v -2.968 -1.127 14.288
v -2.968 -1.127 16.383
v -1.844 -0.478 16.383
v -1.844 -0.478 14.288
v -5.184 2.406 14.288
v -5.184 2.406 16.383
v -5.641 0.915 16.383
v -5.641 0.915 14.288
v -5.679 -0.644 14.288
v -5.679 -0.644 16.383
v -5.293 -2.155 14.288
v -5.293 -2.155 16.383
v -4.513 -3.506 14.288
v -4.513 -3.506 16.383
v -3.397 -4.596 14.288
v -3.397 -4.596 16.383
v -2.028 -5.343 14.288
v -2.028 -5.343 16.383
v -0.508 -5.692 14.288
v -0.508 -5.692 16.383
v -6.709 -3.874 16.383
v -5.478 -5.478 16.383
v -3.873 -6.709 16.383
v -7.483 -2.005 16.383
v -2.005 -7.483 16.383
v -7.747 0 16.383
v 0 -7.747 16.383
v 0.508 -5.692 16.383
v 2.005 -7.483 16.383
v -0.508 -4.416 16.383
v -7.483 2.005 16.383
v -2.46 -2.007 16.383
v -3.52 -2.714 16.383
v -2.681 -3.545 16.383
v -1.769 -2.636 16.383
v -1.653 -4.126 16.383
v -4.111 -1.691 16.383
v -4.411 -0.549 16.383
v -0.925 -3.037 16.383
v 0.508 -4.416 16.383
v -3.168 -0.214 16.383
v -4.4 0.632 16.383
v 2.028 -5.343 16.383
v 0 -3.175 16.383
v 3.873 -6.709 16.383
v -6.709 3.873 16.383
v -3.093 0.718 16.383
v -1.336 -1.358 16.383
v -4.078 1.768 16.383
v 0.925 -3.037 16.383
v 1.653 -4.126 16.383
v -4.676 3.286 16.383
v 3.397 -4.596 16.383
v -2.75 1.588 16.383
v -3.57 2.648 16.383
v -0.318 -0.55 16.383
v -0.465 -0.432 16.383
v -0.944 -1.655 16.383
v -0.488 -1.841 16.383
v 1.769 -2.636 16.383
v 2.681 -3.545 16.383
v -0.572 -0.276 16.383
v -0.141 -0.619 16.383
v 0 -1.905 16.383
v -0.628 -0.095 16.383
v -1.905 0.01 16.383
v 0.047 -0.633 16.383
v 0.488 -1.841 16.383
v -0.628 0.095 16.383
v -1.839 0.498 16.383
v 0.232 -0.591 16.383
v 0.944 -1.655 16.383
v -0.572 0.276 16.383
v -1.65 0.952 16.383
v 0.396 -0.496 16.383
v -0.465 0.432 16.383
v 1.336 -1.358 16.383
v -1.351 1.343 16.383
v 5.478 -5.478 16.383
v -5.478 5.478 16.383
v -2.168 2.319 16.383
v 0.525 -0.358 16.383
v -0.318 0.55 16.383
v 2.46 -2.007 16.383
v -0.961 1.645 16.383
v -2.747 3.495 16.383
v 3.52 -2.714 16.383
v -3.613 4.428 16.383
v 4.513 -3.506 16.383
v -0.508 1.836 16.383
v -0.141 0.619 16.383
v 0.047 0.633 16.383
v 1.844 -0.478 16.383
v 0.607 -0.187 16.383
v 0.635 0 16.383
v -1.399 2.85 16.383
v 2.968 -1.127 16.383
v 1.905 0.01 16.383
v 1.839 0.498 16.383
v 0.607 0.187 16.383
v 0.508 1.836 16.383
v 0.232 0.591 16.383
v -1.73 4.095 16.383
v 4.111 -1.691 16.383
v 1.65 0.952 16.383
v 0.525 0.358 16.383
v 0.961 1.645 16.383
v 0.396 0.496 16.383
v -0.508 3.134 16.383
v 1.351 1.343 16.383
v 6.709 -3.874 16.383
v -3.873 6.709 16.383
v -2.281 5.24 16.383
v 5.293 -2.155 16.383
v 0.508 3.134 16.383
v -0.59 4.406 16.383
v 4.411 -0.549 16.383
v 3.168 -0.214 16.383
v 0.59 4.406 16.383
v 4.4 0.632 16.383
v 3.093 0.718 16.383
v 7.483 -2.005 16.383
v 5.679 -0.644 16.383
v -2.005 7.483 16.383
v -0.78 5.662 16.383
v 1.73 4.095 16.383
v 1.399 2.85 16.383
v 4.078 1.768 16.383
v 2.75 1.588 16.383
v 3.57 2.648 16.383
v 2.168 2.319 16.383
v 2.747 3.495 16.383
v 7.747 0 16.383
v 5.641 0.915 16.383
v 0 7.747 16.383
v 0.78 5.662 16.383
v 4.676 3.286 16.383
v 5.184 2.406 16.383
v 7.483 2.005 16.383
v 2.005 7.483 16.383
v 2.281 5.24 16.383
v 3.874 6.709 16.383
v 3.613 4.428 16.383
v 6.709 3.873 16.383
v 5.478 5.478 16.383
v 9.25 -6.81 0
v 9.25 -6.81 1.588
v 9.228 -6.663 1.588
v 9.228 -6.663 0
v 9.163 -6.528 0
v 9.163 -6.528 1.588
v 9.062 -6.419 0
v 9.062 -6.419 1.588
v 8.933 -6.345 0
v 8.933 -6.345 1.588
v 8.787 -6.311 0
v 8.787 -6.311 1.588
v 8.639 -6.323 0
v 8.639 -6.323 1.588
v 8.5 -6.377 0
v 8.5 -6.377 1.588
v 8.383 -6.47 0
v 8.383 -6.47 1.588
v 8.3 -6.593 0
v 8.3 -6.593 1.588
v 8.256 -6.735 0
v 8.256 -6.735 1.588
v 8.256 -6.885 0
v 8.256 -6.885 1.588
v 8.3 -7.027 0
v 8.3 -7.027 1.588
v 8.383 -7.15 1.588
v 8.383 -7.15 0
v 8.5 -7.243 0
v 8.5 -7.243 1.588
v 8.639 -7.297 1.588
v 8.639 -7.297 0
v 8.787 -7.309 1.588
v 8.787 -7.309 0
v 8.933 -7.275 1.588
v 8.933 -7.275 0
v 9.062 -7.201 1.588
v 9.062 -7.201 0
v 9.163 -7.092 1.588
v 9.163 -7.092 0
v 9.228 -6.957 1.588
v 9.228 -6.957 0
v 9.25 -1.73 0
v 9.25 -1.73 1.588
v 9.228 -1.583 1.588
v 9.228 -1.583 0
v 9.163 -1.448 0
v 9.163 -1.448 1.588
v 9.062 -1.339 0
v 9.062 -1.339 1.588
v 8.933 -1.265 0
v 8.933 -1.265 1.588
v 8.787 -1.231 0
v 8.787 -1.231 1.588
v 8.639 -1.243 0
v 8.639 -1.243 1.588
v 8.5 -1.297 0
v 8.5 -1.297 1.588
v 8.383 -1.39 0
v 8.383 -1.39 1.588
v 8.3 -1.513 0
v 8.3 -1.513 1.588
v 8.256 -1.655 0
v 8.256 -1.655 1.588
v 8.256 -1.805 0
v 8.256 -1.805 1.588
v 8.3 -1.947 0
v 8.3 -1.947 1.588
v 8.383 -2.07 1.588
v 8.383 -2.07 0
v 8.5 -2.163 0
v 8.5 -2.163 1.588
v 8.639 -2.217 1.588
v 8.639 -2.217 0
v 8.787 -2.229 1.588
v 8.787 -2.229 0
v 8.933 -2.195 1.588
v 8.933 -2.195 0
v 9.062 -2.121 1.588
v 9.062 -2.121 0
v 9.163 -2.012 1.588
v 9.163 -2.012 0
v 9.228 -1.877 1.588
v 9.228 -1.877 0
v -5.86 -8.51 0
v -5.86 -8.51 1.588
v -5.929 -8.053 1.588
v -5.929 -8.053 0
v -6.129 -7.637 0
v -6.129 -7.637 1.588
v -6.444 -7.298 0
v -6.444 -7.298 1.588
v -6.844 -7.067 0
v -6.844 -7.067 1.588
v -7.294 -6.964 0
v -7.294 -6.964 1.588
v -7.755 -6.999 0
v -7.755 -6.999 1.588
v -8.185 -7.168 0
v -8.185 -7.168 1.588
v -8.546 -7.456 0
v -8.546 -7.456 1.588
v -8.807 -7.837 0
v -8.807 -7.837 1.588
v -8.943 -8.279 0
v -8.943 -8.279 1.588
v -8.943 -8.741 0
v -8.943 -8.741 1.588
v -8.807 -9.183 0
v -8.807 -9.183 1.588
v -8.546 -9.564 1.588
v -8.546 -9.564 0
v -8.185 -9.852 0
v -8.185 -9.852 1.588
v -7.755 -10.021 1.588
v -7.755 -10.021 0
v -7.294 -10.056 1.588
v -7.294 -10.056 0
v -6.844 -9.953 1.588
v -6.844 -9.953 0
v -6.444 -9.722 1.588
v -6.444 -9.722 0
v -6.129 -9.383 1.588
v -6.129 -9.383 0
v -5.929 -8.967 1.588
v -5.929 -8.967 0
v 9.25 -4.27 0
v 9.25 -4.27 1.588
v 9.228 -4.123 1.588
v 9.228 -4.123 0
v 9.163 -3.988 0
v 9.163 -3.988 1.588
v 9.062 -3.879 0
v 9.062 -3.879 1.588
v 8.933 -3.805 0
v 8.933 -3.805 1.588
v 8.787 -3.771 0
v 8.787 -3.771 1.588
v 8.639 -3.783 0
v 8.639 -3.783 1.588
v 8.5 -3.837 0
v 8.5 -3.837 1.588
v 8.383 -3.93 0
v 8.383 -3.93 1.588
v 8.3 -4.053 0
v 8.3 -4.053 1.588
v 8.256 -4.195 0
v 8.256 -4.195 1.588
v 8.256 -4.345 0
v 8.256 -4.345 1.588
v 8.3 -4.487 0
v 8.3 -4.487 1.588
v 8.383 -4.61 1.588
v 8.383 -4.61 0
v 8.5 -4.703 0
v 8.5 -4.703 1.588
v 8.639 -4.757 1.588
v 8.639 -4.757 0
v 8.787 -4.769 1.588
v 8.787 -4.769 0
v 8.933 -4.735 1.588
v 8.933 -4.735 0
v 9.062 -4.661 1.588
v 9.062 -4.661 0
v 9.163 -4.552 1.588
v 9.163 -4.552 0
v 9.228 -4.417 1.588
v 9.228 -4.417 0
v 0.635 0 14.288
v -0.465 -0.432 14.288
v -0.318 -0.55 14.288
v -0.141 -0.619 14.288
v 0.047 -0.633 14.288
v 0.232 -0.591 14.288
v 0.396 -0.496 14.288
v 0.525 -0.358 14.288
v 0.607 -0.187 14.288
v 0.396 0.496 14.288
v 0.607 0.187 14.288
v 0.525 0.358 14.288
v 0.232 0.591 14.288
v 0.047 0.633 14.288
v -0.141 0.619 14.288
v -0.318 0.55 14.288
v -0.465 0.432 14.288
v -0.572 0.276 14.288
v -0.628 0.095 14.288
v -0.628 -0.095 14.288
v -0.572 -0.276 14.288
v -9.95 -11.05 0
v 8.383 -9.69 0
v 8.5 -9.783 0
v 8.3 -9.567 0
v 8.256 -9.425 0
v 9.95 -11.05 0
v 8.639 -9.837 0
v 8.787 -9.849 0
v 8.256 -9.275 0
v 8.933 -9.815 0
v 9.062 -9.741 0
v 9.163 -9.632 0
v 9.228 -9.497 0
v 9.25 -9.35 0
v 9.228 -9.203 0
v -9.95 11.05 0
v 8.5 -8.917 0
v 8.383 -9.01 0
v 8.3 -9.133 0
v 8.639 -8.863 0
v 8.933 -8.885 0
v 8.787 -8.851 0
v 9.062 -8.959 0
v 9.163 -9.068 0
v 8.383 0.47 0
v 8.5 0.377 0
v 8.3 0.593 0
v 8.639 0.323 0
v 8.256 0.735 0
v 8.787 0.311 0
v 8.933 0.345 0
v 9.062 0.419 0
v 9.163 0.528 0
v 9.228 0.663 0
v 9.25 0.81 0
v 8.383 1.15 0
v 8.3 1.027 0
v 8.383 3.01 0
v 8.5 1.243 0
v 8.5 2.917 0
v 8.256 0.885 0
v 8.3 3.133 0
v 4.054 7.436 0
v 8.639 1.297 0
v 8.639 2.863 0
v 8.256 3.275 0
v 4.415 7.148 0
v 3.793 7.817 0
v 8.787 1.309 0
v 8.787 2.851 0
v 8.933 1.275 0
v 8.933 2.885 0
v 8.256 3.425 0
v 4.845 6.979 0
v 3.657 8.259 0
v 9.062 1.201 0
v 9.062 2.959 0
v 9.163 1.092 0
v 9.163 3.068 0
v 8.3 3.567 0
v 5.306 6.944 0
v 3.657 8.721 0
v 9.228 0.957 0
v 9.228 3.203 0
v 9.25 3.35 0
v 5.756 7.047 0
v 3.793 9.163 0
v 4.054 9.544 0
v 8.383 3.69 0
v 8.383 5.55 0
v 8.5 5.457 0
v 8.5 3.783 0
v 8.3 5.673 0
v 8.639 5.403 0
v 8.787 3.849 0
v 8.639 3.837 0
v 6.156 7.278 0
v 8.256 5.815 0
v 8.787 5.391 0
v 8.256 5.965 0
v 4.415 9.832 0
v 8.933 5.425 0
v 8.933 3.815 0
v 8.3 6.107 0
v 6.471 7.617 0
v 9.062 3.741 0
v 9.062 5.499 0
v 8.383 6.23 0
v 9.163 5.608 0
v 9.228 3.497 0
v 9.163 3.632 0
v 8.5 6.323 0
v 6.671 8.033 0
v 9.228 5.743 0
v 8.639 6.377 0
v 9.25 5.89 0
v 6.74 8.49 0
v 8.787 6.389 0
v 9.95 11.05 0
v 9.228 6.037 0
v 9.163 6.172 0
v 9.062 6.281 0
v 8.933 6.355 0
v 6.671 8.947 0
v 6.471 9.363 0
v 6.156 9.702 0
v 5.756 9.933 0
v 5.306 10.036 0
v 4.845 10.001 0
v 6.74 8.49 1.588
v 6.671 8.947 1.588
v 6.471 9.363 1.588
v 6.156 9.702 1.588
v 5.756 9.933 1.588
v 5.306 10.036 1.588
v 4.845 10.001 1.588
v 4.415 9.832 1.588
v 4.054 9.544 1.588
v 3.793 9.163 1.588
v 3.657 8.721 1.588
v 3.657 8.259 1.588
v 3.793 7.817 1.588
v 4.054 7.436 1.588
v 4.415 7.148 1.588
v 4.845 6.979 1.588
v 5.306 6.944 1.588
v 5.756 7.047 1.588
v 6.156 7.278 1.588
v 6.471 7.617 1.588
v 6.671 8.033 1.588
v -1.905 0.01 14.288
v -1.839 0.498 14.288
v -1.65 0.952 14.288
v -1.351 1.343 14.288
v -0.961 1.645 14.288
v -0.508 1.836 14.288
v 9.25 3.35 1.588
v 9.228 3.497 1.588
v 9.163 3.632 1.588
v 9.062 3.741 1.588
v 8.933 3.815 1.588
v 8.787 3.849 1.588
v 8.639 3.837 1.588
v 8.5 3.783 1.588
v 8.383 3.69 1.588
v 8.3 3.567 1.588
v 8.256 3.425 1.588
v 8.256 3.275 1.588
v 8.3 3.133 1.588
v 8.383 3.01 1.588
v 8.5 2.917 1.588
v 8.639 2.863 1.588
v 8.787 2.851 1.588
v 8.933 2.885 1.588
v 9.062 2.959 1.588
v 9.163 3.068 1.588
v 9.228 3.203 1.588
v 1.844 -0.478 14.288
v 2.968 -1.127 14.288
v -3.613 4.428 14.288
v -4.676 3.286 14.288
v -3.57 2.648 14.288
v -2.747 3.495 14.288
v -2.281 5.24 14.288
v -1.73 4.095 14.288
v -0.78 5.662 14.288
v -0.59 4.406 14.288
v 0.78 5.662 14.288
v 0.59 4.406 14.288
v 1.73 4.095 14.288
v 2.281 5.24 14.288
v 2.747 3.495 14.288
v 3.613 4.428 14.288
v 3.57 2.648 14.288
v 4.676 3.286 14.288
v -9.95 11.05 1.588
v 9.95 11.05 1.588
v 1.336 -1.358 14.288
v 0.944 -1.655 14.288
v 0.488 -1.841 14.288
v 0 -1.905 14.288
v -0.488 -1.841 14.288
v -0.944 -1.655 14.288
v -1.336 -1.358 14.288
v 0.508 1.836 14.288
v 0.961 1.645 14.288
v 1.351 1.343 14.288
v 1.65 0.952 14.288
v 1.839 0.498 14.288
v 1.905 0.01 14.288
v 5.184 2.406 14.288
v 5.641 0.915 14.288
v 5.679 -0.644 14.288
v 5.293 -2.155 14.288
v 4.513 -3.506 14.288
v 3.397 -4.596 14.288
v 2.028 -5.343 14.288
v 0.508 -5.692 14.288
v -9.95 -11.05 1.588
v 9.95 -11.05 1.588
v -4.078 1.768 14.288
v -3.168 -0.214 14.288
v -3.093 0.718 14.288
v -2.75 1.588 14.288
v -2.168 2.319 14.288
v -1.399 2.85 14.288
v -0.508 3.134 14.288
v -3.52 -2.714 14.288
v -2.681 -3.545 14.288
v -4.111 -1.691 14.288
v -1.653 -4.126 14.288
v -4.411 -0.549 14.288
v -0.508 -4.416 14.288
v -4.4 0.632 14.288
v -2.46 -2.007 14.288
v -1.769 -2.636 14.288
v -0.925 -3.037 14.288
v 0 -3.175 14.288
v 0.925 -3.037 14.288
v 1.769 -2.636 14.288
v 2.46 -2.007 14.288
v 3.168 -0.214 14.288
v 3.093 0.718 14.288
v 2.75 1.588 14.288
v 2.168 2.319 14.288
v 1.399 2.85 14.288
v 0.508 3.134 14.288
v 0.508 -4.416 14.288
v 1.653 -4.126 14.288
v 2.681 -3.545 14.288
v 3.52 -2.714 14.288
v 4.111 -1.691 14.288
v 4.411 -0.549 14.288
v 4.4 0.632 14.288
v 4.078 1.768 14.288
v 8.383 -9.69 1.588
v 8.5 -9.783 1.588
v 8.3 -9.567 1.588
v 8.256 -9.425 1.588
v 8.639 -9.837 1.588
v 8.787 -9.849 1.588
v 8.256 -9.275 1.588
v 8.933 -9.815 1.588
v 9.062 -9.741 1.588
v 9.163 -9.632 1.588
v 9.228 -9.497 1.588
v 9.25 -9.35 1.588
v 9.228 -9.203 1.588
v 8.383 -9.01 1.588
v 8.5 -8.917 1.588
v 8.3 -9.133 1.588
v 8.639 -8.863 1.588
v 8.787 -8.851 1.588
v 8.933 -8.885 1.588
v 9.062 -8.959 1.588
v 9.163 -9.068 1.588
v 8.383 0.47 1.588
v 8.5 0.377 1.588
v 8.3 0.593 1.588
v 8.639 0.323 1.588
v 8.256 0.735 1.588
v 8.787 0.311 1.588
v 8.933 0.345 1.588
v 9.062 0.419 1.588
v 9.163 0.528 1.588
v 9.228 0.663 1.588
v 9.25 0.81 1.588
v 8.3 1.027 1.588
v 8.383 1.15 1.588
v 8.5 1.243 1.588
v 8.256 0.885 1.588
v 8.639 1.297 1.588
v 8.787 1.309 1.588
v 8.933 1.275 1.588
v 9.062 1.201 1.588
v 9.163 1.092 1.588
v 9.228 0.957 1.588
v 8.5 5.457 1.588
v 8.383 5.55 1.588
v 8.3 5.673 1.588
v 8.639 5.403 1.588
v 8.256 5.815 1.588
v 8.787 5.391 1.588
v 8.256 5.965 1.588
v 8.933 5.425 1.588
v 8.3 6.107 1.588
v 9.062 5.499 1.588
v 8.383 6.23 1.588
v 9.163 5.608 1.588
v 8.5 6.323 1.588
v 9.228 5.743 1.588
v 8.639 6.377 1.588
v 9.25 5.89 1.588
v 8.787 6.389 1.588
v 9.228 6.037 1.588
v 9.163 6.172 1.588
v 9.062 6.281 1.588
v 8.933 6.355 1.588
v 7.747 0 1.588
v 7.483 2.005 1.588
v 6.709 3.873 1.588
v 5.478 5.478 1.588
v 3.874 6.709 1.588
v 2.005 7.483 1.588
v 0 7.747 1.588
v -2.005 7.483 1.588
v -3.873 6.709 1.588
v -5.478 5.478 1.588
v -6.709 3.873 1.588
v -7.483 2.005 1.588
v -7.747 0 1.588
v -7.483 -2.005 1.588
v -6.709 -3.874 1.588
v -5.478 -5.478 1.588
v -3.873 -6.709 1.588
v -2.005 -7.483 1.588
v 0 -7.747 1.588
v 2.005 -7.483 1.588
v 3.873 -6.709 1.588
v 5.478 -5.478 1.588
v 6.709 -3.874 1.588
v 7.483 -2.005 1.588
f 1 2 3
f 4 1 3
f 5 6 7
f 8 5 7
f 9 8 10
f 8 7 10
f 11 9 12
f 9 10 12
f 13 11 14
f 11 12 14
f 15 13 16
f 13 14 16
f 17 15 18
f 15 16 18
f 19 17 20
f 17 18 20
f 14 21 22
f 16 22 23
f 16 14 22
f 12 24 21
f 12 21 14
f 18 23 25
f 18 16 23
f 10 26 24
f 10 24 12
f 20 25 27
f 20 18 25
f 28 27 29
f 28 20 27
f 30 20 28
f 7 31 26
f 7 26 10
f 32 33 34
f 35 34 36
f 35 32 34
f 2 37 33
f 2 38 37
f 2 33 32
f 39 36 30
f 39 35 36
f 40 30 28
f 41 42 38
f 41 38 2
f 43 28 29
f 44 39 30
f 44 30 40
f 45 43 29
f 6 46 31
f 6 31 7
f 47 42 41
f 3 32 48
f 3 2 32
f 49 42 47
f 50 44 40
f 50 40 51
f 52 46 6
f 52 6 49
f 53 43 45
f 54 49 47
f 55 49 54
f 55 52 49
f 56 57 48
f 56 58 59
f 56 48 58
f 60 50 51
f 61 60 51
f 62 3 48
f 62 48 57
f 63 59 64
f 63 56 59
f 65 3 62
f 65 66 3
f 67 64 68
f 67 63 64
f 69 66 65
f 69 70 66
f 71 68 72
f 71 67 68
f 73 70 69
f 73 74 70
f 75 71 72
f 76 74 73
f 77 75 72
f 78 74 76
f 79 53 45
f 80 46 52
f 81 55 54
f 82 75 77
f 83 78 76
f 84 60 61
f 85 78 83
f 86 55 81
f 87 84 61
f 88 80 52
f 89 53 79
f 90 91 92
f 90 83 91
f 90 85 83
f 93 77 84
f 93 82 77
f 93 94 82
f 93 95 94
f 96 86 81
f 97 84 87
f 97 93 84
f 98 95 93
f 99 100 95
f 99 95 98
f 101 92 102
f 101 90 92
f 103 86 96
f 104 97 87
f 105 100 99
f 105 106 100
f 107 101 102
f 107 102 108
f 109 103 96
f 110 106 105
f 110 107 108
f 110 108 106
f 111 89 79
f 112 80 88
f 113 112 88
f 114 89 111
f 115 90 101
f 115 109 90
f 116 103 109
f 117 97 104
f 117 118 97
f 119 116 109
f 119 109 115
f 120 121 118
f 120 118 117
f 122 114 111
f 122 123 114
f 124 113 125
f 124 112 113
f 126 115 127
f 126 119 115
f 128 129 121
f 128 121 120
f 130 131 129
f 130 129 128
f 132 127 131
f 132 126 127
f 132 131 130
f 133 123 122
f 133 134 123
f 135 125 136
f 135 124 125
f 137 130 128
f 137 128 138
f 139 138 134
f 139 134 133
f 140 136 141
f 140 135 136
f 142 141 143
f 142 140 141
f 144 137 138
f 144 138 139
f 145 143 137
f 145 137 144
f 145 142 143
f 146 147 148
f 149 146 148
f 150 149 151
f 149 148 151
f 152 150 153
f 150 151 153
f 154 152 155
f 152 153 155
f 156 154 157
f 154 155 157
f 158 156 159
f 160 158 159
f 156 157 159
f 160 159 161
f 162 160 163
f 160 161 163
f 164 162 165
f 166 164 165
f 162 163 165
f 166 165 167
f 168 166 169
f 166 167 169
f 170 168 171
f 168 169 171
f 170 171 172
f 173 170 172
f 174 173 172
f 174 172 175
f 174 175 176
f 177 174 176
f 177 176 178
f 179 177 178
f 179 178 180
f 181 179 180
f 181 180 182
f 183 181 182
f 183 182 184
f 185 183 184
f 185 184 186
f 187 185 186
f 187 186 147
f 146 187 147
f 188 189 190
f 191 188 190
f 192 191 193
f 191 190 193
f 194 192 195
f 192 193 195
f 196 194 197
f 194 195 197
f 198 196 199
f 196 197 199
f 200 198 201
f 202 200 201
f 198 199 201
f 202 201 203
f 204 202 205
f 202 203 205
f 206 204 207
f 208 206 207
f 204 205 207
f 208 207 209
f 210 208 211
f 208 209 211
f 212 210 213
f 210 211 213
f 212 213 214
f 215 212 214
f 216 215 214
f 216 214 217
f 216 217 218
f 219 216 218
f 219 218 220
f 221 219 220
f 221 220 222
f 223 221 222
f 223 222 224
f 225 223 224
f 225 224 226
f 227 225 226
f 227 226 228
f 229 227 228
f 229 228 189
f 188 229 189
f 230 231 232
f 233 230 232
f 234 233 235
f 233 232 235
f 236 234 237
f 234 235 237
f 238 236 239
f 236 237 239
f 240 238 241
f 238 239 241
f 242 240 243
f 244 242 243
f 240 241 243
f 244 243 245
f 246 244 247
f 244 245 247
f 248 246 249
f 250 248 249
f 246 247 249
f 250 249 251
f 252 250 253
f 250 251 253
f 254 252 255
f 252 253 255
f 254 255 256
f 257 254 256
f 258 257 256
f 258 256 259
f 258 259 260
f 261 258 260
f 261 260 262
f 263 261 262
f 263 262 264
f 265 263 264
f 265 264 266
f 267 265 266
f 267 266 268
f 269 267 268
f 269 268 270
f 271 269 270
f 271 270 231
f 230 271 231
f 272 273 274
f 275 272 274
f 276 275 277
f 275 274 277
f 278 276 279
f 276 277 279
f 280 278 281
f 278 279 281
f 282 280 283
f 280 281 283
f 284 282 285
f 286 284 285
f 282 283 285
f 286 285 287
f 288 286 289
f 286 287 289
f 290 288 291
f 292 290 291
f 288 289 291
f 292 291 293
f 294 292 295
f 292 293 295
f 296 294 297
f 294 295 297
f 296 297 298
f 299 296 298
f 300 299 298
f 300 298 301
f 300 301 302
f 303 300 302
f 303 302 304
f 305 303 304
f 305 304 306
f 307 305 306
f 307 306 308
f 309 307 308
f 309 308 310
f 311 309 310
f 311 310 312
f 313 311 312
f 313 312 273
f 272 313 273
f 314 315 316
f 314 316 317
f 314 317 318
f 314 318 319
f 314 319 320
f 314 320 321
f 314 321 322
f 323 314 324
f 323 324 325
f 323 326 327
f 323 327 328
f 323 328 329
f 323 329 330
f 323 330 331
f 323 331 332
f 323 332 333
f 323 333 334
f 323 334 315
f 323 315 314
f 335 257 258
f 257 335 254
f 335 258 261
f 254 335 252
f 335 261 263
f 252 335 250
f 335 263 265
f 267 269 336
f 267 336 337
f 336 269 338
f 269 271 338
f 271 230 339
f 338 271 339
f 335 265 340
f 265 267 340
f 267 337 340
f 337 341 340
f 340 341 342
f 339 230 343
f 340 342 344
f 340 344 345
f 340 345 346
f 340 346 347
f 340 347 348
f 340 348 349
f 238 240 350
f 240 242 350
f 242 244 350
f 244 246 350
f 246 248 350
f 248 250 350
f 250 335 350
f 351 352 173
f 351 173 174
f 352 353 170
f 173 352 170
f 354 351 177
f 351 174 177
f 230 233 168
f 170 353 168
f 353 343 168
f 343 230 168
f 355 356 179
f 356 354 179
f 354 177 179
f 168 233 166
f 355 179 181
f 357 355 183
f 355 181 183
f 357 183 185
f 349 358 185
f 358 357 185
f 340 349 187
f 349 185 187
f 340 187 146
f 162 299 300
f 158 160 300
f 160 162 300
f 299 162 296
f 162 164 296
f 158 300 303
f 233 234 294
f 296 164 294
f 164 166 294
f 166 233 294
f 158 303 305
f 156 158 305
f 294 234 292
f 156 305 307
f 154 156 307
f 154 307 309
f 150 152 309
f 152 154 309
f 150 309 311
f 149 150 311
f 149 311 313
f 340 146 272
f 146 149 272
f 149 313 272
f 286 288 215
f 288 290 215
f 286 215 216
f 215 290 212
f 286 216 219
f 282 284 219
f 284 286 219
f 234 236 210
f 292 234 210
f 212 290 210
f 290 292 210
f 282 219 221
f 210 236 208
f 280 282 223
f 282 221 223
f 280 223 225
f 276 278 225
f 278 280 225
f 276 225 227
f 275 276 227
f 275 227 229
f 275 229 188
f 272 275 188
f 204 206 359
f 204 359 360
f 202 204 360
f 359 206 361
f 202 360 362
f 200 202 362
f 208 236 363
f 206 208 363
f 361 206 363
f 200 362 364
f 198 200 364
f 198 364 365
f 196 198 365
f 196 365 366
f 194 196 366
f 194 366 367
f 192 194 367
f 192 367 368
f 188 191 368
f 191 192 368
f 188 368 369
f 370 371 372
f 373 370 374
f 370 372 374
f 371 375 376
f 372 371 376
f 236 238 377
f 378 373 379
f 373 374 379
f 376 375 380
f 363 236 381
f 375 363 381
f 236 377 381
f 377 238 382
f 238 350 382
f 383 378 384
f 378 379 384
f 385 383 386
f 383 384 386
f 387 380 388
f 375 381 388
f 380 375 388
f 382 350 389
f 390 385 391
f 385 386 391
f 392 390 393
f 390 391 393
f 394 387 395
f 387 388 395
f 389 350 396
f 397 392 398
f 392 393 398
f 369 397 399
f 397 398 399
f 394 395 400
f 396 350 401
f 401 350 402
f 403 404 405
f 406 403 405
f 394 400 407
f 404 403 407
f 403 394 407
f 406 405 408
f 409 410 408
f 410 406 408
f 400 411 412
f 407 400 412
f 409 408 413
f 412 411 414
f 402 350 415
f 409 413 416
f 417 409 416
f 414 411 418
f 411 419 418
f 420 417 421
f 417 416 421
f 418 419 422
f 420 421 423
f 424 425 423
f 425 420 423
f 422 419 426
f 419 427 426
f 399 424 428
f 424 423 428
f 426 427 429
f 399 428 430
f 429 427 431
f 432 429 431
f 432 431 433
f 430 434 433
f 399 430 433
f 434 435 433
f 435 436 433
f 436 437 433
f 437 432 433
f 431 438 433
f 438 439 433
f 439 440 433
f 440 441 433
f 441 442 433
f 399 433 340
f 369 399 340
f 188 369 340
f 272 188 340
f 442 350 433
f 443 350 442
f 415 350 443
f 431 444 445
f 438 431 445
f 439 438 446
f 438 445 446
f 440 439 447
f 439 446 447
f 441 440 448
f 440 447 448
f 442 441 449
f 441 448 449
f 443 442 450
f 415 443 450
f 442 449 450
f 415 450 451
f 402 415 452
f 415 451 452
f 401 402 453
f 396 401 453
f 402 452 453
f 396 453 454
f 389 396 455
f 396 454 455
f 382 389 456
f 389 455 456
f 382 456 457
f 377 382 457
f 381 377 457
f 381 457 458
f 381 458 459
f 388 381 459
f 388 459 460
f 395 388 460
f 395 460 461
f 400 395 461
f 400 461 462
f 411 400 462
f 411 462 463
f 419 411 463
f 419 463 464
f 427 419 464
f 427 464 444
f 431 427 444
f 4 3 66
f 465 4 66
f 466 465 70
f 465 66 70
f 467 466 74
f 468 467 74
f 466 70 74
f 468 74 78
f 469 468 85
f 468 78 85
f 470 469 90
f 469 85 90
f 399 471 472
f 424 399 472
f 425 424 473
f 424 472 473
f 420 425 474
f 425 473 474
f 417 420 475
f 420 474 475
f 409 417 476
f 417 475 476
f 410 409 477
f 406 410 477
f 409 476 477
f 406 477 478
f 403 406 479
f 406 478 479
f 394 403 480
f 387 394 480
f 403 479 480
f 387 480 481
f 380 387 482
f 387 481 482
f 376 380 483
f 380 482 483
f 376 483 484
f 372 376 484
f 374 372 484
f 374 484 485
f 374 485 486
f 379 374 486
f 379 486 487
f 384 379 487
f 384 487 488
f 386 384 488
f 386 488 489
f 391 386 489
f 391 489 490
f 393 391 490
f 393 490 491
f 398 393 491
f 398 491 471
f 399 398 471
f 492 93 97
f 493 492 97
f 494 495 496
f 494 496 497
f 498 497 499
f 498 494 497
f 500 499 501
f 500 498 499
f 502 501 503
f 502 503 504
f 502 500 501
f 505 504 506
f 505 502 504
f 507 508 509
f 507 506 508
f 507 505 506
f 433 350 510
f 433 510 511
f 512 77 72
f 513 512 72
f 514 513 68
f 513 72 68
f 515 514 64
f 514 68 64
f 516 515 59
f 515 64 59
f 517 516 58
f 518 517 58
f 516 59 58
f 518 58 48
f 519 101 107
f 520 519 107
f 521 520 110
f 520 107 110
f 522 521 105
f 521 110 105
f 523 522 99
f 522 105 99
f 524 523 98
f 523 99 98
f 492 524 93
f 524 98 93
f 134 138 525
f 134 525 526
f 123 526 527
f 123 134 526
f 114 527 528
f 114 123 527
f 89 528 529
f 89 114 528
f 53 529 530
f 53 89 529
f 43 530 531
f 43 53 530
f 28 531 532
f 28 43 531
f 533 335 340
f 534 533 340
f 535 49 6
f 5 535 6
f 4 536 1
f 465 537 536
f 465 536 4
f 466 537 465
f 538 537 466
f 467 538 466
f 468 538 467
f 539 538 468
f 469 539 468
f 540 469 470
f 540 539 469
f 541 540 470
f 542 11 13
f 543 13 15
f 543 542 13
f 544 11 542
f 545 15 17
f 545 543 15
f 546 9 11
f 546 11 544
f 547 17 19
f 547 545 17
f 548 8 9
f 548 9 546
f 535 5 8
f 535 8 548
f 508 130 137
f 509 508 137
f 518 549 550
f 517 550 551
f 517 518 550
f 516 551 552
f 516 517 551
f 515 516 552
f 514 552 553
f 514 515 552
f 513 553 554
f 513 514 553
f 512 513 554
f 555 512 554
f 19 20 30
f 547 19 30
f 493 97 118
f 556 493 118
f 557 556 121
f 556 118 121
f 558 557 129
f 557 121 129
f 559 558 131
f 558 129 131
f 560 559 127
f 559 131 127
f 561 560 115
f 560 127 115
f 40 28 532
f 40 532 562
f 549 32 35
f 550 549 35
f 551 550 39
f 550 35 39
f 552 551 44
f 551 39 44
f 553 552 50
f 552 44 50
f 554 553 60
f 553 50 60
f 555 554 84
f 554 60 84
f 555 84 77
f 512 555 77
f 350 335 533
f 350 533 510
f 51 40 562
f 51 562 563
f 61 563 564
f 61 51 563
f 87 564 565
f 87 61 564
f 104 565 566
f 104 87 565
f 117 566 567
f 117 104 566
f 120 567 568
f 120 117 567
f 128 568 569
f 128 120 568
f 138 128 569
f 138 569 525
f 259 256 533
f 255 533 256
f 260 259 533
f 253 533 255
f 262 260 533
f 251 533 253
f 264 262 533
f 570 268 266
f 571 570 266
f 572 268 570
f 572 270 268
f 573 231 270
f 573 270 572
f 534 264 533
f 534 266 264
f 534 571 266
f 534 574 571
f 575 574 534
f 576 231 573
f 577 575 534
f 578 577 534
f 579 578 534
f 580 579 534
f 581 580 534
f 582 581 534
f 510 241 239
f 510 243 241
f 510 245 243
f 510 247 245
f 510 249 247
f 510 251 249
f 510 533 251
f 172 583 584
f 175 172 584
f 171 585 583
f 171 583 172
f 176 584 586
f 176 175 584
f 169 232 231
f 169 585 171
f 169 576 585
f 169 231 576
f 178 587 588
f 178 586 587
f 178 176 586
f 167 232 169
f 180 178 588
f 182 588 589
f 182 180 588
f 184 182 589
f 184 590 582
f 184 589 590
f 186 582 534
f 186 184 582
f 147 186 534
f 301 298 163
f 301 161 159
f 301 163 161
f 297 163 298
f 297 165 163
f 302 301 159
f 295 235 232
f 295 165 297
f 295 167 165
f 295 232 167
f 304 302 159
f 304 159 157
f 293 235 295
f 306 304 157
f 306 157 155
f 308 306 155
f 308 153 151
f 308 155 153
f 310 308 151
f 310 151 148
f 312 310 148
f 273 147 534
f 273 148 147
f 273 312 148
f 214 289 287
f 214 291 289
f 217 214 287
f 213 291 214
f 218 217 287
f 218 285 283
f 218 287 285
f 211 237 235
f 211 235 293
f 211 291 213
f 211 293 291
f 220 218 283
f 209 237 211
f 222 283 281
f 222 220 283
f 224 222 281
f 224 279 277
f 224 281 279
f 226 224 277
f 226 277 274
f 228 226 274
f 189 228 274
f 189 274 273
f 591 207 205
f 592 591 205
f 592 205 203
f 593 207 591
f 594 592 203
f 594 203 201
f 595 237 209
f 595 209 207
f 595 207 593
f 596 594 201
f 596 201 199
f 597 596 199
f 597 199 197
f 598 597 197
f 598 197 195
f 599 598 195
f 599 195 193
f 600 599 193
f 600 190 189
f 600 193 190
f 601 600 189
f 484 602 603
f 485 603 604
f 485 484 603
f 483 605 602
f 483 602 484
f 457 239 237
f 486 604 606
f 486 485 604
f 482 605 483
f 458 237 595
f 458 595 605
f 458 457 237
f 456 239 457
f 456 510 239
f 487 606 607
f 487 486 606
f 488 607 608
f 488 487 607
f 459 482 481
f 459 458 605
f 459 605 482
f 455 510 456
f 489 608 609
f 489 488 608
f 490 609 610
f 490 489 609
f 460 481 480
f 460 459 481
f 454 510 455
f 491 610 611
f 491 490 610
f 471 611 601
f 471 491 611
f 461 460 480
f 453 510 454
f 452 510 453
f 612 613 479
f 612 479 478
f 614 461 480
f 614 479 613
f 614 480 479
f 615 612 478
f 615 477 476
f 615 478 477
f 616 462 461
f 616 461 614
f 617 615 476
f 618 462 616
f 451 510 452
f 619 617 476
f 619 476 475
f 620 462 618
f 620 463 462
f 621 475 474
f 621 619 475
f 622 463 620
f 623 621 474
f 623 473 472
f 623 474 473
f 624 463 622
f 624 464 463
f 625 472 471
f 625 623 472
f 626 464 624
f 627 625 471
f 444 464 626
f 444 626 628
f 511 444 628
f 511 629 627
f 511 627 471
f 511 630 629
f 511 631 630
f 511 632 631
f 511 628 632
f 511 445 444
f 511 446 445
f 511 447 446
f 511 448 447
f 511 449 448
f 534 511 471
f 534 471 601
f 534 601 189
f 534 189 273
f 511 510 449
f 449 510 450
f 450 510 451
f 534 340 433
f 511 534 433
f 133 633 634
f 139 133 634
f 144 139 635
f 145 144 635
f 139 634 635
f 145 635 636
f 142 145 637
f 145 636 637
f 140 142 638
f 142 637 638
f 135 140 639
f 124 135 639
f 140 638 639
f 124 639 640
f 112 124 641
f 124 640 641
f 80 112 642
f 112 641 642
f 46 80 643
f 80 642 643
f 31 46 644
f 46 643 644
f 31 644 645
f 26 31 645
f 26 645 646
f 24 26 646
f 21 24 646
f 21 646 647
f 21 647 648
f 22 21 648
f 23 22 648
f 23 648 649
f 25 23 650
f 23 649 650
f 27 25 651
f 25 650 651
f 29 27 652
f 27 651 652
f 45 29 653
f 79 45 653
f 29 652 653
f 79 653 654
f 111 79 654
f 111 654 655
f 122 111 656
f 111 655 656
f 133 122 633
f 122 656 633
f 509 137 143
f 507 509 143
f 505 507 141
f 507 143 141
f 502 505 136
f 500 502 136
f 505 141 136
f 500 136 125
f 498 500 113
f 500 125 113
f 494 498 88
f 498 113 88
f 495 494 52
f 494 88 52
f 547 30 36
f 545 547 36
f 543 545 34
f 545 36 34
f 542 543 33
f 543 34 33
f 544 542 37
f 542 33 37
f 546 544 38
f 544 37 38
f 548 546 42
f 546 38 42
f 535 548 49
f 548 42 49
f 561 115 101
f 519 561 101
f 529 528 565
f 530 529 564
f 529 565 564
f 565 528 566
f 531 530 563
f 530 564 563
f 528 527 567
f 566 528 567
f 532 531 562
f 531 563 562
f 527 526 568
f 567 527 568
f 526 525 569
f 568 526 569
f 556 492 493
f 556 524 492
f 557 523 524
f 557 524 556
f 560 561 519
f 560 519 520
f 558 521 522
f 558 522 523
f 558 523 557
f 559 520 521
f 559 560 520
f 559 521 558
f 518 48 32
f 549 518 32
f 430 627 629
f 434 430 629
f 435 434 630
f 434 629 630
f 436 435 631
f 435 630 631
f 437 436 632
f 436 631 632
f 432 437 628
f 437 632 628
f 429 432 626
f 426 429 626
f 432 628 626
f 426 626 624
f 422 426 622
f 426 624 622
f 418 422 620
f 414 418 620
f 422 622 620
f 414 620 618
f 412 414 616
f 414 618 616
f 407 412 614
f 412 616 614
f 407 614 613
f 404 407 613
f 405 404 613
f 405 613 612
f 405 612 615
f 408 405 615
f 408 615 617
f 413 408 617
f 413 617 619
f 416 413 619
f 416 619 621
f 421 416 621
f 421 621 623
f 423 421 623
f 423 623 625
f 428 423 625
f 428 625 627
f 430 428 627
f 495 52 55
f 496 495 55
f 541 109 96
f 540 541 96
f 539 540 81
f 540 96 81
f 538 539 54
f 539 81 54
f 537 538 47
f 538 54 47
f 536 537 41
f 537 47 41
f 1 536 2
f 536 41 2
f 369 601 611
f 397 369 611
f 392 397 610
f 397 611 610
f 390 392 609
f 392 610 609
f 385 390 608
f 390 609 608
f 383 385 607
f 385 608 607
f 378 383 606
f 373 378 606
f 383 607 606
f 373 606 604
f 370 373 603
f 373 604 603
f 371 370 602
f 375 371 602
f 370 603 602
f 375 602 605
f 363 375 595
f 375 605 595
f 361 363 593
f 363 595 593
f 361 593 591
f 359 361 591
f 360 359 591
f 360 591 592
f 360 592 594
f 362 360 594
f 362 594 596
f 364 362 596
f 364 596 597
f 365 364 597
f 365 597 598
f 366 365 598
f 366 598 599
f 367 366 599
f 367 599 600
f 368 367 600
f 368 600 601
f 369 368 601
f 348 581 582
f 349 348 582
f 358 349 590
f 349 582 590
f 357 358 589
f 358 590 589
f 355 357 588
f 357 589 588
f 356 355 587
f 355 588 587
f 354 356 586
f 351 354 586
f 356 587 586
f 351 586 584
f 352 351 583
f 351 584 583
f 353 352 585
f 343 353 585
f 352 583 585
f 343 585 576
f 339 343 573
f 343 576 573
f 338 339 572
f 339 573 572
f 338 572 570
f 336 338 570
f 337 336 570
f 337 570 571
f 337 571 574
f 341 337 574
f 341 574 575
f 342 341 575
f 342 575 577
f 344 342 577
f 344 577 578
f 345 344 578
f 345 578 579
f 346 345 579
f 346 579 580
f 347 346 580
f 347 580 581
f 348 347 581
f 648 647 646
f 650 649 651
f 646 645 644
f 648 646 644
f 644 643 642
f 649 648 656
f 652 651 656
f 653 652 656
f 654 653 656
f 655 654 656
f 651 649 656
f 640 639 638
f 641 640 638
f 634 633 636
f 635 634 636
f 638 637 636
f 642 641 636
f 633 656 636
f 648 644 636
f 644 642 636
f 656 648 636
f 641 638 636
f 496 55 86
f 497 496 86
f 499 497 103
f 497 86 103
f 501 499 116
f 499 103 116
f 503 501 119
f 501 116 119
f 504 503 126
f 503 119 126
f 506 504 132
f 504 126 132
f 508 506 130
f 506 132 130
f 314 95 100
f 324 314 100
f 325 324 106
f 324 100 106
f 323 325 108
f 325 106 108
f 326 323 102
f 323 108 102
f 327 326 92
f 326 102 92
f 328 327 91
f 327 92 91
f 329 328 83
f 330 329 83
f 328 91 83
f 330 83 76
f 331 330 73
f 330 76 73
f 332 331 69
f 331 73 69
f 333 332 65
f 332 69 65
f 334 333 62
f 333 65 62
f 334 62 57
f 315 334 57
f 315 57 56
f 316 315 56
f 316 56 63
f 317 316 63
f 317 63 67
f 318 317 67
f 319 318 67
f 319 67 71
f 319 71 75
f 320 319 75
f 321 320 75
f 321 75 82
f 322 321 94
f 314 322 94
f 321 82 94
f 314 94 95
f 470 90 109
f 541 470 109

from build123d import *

# Parameters (mm, degrees)
SKETCH1_W          = 19.9
SKETCH1_H          = 22.1
EXTRUDE1_DEPTH     = 1.5875
SKETCH2_R          = 7.747
EXTRUDE2_DEPTH     = 14.7955
SKETCH3_R          = 0.635
EXTRUDE3_DEPTH     = 2.0955
SKETCH5_R          = 1.55
CUT_EXTRUDE1_DEPTH = 2.5875
SKETCH6_R          = 0.5
CUT_EXTRUDE2_DEPTH = 2.5875


with BuildPart() as part:
    # Sketch1 → Extrude1 (new body)
    with BuildSketch(Plane.XY):
        Rectangle(SKETCH1_W, SKETCH1_H)
    extrude(amount=EXTRUDE1_DEPTH)

    # Sketch5 → Cut-Extrude1 (cut, through all)
    with BuildSketch(Plane.XY.offset(1.5875)):
        with Locations((5.19, 8.49)):
            Circle(SKETCH5_R)
        with Locations((-7.41, -8.51)):
            Circle(SKETCH5_R)
    extrude(amount=-CUT_EXTRUDE1_DEPTH, mode=Mode.SUBTRACT)

    # Sketch6 → Cut-Extrude2 (cut, through all)
    with BuildSketch(Plane.XY.offset(1.5875)):
        with Locations((8.75, 5.89)):
            Circle(SKETCH6_R)
        with Locations((8.75, 3.35)):
            Circle(SKETCH6_R)
        with Locations((8.75, 0.81)):
            Circle(SKETCH6_R)
        with Locations((8.75, -1.73)):
            Circle(SKETCH6_R)
        with Locations((8.75, -4.27)):
            Circle(SKETCH6_R)
        with Locations((8.75, -6.81)):
            Circle(SKETCH6_R)
        with Locations((8.75, -9.35)):
            Circle(SKETCH6_R)
    extrude(amount=-CUT_EXTRUDE2_DEPTH, mode=Mode.SUBTRACT)


with BuildPart() as body_2:
    # Sketch2 → Extrude2 (new body)
    with BuildSketch(Plane.XY.offset(1.5875)):
        Circle(SKETCH2_R)
    extrude(amount=EXTRUDE2_DEPTH)

    # Sketch3 → Extrude3 (cut)
    with BuildSketch(Plane.XY.offset(16.383)):
        with BuildLine():
            Line((3.570260811, 2.647878914), (4.675743477, 3.286129629))
            ThreePointArc((4.675743477, 3.286129629), (0, 5.715), (-4.675743477, 3.286129629))
            Line((-4.675743477, 3.286129629), (-3.570260811, 2.647878914))
            ThreePointArc((-3.570260811, 2.647878914), (0, 4.445), (3.570260811, 2.647878914))
        make_face()
        with BuildLine():
            Line((-4.078260811, 1.767997104), (-5.183743477, 2.406247818))
            ThreePointArc((-5.183743477, 2.406247818), (-4.949335183, -2.8575), (-0.508, -5.692377447))
            Line((-0.508, -5.692377447), (-0.508, -4.415876017))
            ThreePointArc((-0.508, -4.415876017), (-3.84948292, -2.2225), (-4.078260811, 1.767997104))
        make_face()
        with BuildLine():
            Line((-0.508, 1.836017701), (-0.508, 3.134096521))
            ThreePointArc((-0.508, 3.134096521), (-2.749630657, 1.5875), (-2.968207205, -1.127107355))
            Line((-2.968207205, -1.127107355), (-1.844037971, -0.478067946))
            ThreePointArc((-1.844037971, -0.478067946), (-1.649778394, 0.9525), (-0.508, 1.836017701))
        make_face()
        with BuildLine():
            Line((-1.336037971, -1.357949756), (-2.460207205, -2.006989165))
            ThreePointArc((-2.460207205, -2.006989165), (0, -3.175), (2.460207205, -2.006989165))
            Line((2.460207205, -2.006989165), (1.336037971, -1.357949756))
            ThreePointArc((1.336037971, -1.357949756), (0, -1.905), (-1.336037971, -1.357949756))
        make_face()
        Circle(SKETCH3_R)
        with BuildLine():
            Line((1.844037971, -0.478067946), (2.968207205, -1.127107355))
            ThreePointArc((2.968207205, -1.127107355), (2.749630657, 1.5875), (0.508, 3.134096521))
            Line((0.508, 3.134096521), (0.508, 1.836017701))
            ThreePointArc((0.508, 1.836017701), (1.649778394, 0.9525), (1.844037971, -0.478067946))
        make_face()
        with BuildLine():
            ThreePointArc((0.508, -4.415876017), (3.84948292, -2.2225), (4.078260811, 1.767997104))
            Line((4.078260811, 1.767997104), (5.183743477, 2.406247818))
            ThreePointArc((5.183743477, 2.406247818), (4.949335183, -2.8575), (0.508, -5.692377447))
            Line((0.508, -5.692377447), (0.508, -4.415876017))
        make_face()
    extrude(amount=-EXTRUDE3_DEPTH, mode=Mode.SUBTRACT)


solid = Compound([part.part, body_2.part])
